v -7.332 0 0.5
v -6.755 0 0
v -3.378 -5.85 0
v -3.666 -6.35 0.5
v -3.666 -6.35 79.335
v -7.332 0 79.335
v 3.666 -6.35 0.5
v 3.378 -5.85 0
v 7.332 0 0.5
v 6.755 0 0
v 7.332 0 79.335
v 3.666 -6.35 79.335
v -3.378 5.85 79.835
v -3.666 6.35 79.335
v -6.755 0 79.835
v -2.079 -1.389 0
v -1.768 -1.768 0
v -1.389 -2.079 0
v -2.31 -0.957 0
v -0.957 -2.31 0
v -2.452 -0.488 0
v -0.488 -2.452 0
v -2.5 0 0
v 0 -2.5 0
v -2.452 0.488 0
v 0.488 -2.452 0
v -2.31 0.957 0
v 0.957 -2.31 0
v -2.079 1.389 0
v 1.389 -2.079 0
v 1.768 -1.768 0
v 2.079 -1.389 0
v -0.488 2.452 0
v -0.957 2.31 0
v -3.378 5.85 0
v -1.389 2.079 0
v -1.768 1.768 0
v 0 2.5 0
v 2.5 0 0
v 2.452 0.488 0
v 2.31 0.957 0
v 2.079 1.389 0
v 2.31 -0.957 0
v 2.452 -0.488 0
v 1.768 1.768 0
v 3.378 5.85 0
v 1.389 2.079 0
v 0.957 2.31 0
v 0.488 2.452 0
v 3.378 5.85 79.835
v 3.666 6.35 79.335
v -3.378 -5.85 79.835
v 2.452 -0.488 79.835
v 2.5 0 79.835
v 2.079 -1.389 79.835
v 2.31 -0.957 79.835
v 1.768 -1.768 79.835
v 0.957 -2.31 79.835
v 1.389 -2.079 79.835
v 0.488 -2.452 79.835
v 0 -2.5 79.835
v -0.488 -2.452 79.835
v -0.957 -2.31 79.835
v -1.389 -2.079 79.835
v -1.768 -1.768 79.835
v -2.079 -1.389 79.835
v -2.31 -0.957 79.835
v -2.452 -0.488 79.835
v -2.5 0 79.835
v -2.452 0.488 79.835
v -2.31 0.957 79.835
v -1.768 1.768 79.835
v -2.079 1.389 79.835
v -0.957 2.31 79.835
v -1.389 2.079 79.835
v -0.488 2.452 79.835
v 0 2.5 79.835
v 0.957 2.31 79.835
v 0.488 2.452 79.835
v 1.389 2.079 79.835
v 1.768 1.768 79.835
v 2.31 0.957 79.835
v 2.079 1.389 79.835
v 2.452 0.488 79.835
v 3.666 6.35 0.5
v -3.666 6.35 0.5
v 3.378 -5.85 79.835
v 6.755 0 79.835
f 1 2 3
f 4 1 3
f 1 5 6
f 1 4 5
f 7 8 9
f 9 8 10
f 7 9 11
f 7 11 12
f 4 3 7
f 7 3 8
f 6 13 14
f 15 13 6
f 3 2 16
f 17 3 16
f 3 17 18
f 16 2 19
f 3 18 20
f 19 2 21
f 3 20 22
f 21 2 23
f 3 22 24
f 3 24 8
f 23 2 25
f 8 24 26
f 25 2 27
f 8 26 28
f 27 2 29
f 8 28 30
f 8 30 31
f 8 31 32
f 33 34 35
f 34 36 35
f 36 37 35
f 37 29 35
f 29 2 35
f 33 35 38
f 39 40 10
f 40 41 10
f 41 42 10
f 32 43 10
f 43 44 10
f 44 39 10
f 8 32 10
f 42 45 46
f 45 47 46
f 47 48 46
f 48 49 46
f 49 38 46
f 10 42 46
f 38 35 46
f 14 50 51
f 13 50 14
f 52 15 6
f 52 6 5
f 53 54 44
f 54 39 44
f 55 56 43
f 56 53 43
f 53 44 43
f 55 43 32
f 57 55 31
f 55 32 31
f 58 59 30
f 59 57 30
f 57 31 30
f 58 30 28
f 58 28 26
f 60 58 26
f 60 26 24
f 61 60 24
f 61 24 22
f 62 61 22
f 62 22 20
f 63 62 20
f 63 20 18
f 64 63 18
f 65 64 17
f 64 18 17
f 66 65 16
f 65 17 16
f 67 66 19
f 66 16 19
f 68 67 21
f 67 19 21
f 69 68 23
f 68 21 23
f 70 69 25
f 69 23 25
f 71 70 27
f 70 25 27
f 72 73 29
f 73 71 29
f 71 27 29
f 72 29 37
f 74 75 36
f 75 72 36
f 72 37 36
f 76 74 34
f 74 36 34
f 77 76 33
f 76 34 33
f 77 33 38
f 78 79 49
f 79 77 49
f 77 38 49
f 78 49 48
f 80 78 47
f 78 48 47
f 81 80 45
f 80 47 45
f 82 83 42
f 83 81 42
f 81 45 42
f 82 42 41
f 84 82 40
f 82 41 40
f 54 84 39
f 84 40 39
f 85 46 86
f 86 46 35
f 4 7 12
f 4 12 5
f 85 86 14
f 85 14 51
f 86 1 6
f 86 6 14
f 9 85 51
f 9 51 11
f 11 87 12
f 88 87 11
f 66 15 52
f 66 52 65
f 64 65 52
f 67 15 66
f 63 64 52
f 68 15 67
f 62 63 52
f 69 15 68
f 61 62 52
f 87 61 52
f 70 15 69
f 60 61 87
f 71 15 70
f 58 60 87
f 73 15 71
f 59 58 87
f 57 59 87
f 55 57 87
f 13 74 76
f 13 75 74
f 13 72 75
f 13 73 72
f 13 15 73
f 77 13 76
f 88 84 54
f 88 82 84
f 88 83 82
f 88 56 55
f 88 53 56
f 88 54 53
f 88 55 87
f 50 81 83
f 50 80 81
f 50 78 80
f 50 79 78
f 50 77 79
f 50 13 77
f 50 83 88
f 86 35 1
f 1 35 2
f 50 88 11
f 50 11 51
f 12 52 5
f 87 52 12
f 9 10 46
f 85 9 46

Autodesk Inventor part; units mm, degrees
ref_plane "YZ Plane" through (0, 0, 0) normal (1, 0, 0) x (0, 1, 0)
ref_plane "XZ Plane" through (0, 0, 0) normal (0, 1, 0) x (-1, 0, 0)
ref_plane "XY Plane" through (0, 0, 0) normal (0, 0, 1) x (1, 0, 0)
sketch "Sketch1" plane through (0, 0, 0) normal (0, 0, 1) x (1, 0, 0)
  circle A0 centre (0, 0) radius 2.5
  line L0 (-7.3323, 0) -> (-3.6662, 6.35)
  line L1 (-3.6662, 6.35) -> (3.6662, 6.35)
  line L2 (3.6662, 6.35) -> (7.3323, 0)
  line L3 (7.3323, 0) -> (3.6662, -6.35)
  line L4 (3.6662, -6.35) -> (-3.6662, -6.35)
  line L5 (-3.6662, -6.35) -> (-7.3323, 0)
  dimension "d0" = 5
  dimension "d1" = 12.7
extrude "Extrusion1" add sketch "Sketch1" along normal blind 79.835
chamfer "Chamfer1" distance 0.5 angle 45 12 edges at (0, -6.35, 0) (-5.4993, -3.175, 0) (-5.4993, 3.175, 0) (0, 6.35, 0) (5.4993, 3.175, 0) (5.4993, -3.175, 0) (0, -6.35, 79.835) (5.4993, -3.175, 79.835) (5.4993, 3.175, 79.835) (0, 6.35, 79.835) (-5.4993, 3.175, 79.835) (-5.4993, -3.175, 79.835)
properties part number "spacers"
